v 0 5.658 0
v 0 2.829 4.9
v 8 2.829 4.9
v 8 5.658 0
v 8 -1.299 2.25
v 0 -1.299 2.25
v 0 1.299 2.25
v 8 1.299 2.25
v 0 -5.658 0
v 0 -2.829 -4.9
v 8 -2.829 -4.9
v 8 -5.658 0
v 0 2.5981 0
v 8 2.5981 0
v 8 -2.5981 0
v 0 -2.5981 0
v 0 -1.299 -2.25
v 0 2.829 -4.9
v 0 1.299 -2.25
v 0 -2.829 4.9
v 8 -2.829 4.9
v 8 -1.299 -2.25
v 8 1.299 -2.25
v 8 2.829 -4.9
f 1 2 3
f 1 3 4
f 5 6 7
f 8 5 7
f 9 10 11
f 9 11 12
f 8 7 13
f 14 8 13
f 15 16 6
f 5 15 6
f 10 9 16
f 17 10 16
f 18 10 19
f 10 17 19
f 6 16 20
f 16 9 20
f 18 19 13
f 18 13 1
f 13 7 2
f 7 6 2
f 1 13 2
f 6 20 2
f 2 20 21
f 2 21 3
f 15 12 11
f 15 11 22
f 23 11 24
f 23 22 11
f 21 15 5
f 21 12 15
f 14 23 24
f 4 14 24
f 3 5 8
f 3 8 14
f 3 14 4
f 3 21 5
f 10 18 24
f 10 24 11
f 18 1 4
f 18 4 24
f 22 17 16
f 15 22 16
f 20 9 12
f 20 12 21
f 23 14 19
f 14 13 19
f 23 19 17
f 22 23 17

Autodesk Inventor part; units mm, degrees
ref_plane "YZ Plane" through (0, 0, 0) normal (1, 0, 0) x (0, 1, 0)
ref_plane "XZ Plane" through (0, 0, 0) normal (0, 1, 0) x (-1, 0, 0)
ref_plane "XY Plane" through (0, 0, 0) normal (0, 0, 1) x (1, 0, 0)
sketch "Sketch1" plane through (0, 0, 0) normal (1, 0, 0) x (0, 1, 0)
  line L0 (-1.299, -2.25) -> (-2.5981, 0)
  line L1 (-2.5981, 0) -> (-1.299, 2.25)
  line L2 (-1.299, 2.25) -> (1.299, 2.25)
  line L3 (1.299, 2.25) -> (2.5981, 0)
  line L4 (2.5981, 0) -> (1.299, -2.25)
  line L5 (1.299, -2.25) -> (-1.299, -2.25)
  line L6 (-2.829, -4.9) -> (-5.658, 0)
  line L7 (-5.658, 0) -> (-2.829, 4.9)
  line L8 (-2.829, 4.9) -> (2.829, 4.9)
  line L9 (2.829, 4.9) -> (5.658, 0)
  line L10 (5.658, 0) -> (2.829, -4.9)
  line L11 (2.829, -4.9) -> (-2.829, -4.9)
  point P0 (0, 0)
  point P1 (0, 0)
  point P2 (0, 0)
  dimension "d0" = 4.5
  dimension "d1" = 9.8
extrude "Extrusion1" add sketch "Sketch1" along normal blind 8
properties part number "Adaptador Acoplador" material "ABS Plastic"
